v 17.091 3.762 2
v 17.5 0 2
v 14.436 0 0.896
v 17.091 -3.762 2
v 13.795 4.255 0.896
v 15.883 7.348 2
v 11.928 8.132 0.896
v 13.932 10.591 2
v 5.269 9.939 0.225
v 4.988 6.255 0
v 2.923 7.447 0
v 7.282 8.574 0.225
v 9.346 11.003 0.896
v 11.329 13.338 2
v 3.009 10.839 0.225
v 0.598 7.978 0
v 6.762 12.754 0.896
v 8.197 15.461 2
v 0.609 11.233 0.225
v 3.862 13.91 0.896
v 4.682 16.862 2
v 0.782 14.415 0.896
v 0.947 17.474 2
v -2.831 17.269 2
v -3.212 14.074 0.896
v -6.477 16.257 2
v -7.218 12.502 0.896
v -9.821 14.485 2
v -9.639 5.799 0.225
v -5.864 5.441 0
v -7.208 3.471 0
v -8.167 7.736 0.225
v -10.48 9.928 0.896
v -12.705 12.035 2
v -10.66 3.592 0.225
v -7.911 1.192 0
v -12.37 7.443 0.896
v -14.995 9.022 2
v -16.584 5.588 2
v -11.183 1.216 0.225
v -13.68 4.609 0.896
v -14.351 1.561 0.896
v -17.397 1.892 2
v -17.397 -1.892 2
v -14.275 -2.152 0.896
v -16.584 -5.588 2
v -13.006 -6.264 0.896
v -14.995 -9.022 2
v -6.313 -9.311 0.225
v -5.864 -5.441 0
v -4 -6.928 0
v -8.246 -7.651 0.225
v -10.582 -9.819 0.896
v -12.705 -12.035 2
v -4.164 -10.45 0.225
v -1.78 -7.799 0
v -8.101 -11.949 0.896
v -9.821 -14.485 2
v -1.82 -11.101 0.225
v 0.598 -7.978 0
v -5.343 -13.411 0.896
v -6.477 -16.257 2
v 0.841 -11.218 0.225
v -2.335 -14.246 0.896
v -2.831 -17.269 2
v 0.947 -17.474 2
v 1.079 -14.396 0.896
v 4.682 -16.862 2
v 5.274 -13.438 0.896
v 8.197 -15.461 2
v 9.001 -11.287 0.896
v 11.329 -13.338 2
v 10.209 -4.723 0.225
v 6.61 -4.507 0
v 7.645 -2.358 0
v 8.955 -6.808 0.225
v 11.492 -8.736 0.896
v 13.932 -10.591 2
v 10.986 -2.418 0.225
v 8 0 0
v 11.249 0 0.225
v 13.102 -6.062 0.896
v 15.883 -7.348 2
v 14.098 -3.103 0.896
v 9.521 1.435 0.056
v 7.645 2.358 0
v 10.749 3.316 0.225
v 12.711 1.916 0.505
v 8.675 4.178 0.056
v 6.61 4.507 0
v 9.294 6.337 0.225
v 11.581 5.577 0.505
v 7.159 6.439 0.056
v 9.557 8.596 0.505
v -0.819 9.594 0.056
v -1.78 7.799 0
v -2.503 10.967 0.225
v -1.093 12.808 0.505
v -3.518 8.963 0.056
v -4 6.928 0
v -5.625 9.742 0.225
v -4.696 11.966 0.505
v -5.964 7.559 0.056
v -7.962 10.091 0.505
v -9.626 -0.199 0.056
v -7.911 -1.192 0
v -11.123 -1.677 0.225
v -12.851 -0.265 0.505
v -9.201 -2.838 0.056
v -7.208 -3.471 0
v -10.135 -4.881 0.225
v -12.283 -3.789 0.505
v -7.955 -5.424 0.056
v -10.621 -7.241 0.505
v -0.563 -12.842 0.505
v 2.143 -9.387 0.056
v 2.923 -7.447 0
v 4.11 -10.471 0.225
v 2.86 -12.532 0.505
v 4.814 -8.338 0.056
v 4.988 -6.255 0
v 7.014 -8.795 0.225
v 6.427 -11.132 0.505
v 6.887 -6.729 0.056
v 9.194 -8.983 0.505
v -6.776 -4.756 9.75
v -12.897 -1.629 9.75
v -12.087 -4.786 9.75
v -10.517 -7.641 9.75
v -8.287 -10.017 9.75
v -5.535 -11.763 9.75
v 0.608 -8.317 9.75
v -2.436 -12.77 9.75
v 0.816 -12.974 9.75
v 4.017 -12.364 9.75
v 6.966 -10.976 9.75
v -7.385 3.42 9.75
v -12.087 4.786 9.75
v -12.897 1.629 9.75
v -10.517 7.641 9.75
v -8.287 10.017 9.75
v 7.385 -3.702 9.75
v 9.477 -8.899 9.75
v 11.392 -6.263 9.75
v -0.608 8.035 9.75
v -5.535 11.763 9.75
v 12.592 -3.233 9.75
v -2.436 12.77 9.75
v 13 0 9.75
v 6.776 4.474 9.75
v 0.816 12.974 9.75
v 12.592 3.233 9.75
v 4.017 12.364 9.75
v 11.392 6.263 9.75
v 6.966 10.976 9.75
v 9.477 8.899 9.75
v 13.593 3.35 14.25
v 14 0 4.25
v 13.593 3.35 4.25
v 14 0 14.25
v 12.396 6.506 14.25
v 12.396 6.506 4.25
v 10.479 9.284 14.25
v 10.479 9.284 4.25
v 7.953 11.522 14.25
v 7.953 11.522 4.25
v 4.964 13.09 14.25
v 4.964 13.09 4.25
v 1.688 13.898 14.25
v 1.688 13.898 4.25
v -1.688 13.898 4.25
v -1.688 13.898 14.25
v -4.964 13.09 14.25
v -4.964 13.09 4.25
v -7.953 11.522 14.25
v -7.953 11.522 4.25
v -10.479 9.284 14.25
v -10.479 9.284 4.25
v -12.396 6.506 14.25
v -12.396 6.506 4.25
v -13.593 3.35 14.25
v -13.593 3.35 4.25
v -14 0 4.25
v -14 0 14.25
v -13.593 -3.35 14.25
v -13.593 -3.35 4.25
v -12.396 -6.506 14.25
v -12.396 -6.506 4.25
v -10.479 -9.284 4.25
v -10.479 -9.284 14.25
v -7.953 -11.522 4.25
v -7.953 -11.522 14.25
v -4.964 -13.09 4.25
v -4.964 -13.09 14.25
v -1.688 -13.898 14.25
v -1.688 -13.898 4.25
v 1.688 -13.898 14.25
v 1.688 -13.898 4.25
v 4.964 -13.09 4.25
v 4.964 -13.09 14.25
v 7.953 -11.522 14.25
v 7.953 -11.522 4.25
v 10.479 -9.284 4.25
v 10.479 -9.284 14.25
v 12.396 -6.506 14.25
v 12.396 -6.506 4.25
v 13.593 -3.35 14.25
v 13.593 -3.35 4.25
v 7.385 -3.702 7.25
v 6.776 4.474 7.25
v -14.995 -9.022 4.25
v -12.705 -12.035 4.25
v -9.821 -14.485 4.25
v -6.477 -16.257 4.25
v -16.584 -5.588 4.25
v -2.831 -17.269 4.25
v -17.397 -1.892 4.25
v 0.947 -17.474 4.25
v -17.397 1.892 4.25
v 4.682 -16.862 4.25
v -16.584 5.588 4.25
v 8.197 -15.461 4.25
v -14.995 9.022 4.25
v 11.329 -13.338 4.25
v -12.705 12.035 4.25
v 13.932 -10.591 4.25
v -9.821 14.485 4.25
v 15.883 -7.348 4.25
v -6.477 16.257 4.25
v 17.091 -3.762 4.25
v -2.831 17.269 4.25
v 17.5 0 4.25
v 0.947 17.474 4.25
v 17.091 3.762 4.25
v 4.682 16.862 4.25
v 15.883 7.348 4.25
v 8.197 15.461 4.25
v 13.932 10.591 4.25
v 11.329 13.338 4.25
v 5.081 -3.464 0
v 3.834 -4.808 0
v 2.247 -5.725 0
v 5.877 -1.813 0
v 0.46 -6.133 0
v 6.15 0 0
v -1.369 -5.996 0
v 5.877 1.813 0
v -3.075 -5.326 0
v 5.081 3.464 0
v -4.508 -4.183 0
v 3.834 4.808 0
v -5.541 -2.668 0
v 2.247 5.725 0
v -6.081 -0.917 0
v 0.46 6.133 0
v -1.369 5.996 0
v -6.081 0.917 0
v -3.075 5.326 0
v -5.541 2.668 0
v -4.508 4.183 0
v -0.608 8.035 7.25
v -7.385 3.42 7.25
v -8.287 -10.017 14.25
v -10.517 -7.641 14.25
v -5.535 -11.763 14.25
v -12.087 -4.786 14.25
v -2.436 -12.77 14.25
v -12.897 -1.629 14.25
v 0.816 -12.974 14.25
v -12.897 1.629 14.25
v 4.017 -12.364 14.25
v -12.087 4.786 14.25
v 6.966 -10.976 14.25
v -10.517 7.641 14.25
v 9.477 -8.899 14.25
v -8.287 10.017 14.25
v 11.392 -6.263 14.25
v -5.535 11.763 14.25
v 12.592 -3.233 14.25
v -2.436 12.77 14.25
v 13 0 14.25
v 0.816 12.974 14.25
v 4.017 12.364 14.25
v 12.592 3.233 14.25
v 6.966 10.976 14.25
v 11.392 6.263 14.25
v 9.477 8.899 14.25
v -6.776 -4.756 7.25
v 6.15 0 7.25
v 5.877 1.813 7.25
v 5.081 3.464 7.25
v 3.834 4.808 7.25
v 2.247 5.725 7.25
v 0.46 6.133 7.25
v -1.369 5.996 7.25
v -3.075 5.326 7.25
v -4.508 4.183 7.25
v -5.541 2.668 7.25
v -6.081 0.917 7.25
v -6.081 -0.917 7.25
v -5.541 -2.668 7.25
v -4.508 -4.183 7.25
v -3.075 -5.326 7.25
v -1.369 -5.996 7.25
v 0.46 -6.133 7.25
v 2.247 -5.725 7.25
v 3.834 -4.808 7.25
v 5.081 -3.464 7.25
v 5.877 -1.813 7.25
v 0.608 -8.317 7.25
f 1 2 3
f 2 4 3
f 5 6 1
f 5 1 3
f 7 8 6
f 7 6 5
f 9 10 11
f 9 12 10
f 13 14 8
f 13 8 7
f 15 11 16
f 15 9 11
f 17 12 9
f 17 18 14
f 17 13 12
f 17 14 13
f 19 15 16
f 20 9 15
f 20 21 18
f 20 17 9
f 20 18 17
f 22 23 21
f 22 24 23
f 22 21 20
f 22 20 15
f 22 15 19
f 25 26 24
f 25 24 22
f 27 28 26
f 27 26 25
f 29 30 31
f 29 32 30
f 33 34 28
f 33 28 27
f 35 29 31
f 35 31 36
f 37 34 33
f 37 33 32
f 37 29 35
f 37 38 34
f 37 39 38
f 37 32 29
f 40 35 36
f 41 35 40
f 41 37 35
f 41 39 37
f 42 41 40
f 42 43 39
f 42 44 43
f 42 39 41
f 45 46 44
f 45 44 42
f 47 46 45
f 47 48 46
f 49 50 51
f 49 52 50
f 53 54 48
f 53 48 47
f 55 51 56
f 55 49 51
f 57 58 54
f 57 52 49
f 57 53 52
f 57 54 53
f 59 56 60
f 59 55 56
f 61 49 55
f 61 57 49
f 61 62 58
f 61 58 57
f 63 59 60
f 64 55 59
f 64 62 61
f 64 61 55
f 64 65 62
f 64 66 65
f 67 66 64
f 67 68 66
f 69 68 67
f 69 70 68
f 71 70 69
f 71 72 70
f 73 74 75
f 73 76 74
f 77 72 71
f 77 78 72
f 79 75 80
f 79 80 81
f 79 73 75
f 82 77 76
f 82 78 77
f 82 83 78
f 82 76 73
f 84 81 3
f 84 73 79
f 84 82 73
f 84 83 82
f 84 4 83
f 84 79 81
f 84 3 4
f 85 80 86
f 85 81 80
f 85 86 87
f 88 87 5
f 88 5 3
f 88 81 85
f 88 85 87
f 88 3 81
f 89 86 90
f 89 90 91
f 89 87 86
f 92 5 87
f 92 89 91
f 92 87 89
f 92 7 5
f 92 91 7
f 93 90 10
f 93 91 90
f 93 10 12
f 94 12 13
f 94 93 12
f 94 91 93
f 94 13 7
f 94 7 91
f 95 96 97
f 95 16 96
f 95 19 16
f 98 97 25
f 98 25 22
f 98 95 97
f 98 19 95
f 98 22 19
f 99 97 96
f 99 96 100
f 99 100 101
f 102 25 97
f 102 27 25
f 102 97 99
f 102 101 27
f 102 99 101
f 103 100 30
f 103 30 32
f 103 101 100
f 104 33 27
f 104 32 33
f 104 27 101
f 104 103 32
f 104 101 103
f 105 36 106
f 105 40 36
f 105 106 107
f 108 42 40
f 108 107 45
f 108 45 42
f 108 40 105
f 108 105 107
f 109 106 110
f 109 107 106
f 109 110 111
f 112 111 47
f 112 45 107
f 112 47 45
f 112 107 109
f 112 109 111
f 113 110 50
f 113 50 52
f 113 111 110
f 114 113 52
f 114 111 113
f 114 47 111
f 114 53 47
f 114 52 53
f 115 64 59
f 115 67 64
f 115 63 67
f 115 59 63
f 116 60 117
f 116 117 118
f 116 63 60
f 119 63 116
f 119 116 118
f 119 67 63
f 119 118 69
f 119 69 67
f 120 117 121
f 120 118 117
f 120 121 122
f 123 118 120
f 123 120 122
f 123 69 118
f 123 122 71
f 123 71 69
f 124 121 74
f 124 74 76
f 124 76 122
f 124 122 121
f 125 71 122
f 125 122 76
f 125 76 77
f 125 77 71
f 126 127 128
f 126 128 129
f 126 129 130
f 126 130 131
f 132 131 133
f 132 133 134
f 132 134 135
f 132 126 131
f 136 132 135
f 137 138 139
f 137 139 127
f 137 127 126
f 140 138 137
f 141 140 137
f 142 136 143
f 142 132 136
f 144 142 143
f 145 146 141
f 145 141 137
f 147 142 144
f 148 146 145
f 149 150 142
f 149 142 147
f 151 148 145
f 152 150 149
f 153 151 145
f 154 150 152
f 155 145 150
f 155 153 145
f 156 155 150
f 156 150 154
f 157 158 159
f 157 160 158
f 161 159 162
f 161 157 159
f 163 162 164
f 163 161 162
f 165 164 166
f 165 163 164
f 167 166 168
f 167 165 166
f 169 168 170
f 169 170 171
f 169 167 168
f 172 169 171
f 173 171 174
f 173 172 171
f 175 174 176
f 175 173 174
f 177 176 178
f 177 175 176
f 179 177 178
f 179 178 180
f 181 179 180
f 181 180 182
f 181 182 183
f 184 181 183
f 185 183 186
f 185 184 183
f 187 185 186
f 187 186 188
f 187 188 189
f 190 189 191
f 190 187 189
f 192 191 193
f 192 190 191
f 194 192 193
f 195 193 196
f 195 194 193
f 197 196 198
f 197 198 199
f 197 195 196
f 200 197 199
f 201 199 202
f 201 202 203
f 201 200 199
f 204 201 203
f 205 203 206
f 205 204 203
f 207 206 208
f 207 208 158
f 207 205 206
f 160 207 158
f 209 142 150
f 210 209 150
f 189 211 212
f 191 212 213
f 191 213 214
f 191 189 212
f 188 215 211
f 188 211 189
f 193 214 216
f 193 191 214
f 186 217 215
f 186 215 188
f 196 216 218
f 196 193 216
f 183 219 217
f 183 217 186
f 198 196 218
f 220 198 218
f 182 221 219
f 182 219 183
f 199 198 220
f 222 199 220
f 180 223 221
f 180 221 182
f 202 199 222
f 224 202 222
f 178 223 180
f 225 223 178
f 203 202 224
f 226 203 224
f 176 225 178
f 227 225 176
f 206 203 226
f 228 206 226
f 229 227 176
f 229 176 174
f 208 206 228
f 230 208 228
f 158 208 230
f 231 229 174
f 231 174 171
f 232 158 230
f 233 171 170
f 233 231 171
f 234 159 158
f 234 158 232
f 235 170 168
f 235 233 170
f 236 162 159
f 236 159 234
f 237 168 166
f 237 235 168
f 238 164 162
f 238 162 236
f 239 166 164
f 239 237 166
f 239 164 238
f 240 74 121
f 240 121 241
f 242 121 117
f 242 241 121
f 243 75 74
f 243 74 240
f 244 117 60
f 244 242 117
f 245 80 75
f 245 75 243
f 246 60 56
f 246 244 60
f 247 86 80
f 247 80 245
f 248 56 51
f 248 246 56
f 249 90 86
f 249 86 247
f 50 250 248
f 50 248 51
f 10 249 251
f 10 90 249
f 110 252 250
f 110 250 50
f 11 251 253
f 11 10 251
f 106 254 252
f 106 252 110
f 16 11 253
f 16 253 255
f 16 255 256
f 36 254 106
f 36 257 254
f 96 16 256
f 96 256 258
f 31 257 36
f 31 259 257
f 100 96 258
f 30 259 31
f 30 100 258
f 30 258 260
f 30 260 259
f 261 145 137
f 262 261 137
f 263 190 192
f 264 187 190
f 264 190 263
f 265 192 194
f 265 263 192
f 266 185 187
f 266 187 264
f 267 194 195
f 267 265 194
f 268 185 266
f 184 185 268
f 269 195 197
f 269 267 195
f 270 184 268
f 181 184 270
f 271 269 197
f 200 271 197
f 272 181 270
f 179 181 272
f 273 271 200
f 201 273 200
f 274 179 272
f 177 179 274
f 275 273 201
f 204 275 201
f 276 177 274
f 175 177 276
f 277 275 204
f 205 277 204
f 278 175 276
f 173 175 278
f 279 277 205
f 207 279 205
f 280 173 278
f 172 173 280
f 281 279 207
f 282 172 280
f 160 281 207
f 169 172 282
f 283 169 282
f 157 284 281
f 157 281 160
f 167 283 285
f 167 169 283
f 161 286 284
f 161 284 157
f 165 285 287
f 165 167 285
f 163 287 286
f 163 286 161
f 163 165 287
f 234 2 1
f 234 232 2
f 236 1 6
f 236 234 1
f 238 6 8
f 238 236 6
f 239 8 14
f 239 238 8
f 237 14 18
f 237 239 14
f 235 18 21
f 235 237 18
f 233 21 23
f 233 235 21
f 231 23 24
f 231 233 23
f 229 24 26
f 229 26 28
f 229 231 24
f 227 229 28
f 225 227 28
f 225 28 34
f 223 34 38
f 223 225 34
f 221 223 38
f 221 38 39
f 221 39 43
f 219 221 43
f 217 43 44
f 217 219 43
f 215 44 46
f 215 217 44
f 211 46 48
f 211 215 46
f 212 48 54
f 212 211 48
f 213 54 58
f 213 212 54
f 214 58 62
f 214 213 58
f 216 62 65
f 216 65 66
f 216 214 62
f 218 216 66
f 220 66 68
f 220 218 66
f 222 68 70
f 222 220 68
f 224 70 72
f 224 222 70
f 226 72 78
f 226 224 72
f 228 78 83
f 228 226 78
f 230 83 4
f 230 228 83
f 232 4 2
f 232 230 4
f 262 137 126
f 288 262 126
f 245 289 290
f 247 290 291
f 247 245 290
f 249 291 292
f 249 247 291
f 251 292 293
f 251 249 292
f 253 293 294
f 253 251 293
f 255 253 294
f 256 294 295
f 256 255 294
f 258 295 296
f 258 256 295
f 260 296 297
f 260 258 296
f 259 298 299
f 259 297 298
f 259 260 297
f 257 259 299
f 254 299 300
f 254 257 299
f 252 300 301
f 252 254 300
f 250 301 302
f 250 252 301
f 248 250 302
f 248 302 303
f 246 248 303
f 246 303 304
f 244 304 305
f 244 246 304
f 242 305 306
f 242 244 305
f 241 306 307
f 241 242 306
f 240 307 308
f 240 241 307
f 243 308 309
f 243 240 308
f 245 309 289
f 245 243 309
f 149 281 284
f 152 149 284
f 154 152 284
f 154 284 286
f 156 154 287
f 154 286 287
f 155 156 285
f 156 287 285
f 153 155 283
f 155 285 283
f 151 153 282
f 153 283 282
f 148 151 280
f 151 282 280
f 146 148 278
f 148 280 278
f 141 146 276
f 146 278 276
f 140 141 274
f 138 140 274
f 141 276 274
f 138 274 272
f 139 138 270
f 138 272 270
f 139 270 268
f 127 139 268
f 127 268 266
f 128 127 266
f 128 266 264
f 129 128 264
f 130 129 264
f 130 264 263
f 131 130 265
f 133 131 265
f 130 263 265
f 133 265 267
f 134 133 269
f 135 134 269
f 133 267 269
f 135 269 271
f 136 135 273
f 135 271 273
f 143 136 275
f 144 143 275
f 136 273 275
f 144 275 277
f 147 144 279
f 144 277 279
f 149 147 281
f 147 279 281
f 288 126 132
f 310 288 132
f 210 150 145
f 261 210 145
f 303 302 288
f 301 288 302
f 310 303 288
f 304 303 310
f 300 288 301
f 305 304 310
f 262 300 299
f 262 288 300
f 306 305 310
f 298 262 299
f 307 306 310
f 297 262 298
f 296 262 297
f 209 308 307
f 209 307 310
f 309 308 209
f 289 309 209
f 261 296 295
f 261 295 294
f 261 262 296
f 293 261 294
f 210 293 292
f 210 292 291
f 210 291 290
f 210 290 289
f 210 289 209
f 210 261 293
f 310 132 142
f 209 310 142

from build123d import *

# Parameters (mm, degrees)
CUT_EXTRUDE2_DEPTH = 7
SKETCH2_R          = 13
CUT_EXTRUDE1_DEPTH = 4.5


with BuildPart() as part:
    # Sketch1 → Revolve1 (revolve)
    with BuildSketch(Plane(origin=(0, 0, 0), x_dir=(1, 0, 0), z_dir=(0, 1, 0))):
        with BuildLine():
            Line((6.15, -14.25), (6.15, 0))
            Line((6.15, 0), (8, 0))
            ThreePointArc((8, 0), (12.85412196, -0.505420691), (17.5, -2))
            Line((17.5, -2), (17.5, -4.25))
            Line((17.5, -4.25), (14, -4.25))
            Line((14, -4.25), (14, -14.25))
            Line((14, -14.25), (6.15, -14.25))
        make_face()
    revolve(axis=Axis((0, 0, 0), (0, 0, 1)))

    # Sketch3 → Cut-Extrude2 (cut)
    with BuildSketch(Plane.XY.offset(14.25)):
        Polygon((0.608498328, -8.31690962), (7.38466563, -3.702054257), (6.776167302, 4.473706449), (-0.608498328, 8.034611791), (-7.38466563, 3.419756428), (-6.776167302, -4.756004278), align=None)
    extrude(amount=-CUT_EXTRUDE2_DEPTH, mode=Mode.SUBTRACT)

    # Sketch2 → Cut-Extrude1 (cut)
    with BuildSketch(Plane.XY.offset(14.25)):
        Circle(SKETCH2_R)
    extrude(amount=-CUT_EXTRUDE1_DEPTH, mode=Mode.SUBTRACT)


solid = part.part
